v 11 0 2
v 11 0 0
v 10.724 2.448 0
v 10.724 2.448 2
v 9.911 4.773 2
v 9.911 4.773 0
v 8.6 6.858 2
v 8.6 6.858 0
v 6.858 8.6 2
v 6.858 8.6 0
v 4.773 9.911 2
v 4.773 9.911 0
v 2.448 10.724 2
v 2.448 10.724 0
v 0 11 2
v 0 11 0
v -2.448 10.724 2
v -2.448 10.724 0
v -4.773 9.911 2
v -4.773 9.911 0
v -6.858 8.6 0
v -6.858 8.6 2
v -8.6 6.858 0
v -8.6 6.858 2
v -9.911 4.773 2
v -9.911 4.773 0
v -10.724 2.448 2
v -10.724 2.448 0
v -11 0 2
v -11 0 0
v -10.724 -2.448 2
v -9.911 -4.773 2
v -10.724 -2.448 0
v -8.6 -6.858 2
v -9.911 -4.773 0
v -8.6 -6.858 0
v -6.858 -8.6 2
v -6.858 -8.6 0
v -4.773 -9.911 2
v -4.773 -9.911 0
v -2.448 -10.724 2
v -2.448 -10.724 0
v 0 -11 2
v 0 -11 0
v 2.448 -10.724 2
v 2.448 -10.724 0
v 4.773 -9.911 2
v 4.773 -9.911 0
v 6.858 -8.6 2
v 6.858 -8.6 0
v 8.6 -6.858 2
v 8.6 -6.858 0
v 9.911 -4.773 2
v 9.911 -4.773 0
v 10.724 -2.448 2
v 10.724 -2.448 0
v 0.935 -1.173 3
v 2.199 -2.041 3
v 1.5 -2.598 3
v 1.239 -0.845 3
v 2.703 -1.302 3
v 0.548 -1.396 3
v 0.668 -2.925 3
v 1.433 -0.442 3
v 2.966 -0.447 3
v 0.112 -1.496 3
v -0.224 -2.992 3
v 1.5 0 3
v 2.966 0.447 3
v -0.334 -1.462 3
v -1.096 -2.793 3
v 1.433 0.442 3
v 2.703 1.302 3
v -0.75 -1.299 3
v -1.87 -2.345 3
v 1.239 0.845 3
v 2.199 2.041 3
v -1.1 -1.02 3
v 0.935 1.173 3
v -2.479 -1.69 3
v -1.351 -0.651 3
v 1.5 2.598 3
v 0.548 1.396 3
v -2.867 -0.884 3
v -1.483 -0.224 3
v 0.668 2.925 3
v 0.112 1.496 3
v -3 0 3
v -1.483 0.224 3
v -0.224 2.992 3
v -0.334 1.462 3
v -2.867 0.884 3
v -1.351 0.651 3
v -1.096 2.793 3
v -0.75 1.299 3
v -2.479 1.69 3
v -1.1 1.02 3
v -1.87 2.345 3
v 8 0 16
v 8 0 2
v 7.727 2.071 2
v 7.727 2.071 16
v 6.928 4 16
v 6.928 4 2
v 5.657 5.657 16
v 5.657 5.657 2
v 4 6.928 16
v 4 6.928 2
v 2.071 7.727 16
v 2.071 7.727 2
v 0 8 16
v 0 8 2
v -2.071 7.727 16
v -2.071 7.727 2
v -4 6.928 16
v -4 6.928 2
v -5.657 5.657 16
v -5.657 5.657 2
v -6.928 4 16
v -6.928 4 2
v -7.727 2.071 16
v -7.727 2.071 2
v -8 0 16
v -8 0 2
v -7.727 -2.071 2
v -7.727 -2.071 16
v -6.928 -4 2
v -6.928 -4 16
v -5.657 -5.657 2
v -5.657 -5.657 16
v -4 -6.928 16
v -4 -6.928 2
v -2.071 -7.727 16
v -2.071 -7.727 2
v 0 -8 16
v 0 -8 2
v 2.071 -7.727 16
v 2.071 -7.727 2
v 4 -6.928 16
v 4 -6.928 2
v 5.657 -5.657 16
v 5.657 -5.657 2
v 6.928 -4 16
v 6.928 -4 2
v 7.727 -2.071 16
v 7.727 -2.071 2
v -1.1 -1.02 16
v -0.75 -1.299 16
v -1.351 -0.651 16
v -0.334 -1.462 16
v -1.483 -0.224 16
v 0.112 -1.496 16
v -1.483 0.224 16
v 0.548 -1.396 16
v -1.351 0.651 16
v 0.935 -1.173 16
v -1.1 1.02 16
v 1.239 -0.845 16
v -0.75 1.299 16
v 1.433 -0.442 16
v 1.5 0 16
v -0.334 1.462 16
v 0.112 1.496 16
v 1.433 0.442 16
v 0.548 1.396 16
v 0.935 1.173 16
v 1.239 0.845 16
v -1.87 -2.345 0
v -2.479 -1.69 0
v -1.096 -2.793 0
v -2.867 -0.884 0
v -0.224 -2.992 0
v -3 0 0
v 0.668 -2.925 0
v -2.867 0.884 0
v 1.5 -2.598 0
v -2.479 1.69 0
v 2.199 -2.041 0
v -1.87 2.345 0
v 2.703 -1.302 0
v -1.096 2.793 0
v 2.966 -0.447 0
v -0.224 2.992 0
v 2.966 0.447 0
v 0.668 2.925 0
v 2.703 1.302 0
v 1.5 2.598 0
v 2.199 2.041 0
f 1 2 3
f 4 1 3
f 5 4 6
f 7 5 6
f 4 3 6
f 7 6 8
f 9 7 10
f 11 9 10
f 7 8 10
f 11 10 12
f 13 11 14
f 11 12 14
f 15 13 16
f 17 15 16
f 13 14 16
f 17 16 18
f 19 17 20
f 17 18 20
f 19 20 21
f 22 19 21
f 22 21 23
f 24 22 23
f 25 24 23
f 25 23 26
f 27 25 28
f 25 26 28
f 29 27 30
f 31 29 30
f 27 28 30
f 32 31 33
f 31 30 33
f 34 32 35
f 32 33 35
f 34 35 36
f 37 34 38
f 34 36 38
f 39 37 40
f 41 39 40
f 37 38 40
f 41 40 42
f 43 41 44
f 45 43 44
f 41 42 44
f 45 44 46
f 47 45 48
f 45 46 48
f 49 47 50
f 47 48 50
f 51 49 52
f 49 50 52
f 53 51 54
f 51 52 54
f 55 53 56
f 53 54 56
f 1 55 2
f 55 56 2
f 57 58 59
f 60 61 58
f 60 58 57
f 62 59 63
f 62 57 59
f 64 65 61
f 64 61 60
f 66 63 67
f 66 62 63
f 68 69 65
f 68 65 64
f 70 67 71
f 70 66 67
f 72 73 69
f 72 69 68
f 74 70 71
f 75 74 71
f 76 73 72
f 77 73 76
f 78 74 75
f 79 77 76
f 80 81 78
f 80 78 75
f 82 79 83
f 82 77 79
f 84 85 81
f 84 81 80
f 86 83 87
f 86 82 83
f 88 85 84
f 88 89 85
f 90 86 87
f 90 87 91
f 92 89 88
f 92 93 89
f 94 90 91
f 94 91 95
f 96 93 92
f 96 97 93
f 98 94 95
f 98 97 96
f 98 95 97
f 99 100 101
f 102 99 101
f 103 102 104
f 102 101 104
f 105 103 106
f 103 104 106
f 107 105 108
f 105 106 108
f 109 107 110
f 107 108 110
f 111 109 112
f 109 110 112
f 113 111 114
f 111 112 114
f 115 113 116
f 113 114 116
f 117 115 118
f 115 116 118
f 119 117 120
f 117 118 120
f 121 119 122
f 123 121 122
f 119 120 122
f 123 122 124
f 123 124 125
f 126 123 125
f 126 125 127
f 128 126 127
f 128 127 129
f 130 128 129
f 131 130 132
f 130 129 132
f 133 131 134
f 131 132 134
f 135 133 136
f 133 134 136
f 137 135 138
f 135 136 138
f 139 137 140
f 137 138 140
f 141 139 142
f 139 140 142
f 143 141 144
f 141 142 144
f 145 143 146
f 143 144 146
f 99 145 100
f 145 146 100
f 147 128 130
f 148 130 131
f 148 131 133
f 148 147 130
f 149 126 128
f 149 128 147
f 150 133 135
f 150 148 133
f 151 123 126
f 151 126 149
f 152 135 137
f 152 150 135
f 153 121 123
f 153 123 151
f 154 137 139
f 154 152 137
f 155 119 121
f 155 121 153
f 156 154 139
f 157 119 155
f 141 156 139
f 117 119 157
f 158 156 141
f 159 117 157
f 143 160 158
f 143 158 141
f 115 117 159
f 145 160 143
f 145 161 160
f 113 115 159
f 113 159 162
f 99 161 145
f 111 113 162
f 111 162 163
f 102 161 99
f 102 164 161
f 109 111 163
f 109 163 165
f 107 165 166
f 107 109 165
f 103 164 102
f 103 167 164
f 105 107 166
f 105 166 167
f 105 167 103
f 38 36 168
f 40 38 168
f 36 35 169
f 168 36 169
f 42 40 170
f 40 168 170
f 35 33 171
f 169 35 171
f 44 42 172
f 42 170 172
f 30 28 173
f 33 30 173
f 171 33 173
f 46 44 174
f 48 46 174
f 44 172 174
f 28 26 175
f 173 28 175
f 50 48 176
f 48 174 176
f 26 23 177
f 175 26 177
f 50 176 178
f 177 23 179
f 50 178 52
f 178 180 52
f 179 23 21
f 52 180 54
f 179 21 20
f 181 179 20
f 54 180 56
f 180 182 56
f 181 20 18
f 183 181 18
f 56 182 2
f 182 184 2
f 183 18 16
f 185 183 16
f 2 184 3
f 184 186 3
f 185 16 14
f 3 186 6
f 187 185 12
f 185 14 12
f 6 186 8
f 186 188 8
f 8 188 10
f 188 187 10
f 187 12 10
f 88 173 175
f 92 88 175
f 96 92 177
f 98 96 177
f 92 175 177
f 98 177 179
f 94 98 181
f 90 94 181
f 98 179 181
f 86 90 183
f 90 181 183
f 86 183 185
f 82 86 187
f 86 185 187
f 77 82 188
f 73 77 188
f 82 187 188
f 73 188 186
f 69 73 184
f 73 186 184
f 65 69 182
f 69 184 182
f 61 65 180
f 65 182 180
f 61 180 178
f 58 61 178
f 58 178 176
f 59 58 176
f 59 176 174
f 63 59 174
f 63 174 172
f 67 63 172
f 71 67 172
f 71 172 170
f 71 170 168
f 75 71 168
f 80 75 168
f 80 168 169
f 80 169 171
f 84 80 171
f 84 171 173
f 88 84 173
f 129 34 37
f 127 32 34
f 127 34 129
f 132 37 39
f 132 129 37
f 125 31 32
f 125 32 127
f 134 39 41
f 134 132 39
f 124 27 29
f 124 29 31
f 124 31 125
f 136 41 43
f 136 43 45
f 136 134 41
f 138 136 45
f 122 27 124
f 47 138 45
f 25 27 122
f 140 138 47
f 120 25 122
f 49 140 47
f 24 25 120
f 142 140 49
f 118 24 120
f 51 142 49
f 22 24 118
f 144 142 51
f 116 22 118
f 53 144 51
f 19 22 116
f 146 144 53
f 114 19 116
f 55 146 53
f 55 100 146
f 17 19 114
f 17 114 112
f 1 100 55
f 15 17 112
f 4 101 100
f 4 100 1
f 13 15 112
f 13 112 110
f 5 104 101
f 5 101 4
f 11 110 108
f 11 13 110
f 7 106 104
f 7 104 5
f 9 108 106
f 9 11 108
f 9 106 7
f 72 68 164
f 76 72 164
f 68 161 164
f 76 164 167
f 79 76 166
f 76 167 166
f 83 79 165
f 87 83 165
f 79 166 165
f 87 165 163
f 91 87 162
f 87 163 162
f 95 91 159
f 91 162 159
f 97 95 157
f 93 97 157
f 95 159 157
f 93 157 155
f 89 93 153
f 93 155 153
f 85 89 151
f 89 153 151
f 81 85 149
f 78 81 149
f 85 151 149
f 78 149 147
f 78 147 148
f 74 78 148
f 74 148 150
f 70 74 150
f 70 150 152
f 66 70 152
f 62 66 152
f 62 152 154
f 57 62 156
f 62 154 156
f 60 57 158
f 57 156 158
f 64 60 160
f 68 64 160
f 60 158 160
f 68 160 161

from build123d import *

# Parameters (mm, degrees)
SKETCH1_R                               = 11
BOSS_EXTRUDE1_DEPTH                     = 2
SKETCH2_R                               = 8
BOSS_EXTRUDE2_DEPTH                     = 14
CBORE_FOR_M5_HEX_HEAD_BOLT1_D           = 3
CBORE_FOR_M5_HEX_HEAD_BOLT1_CBORE_D     = 6
CBORE_FOR_M5_HEX_HEAD_BOLT1_CBORE_DEPTH = 3


with BuildPart() as part:
    # Sketch1 → Boss-Extrude1 (new body)
    with BuildSketch(Plane.XY):
        Circle(SKETCH1_R)
    extrude(amount=BOSS_EXTRUDE1_DEPTH)

    # Sketch2 → Boss-Extrude2 (add)
    with BuildSketch(Plane.XY.offset(2)):
        Circle(SKETCH2_R)
    extrude(amount=BOSS_EXTRUDE2_DEPTH)

    # CBORE for M5 Hex Head Bolt1 (through all)
    with Locations(Plane(origin=(0, 0, 0), x_dir=(-1, 0, 0), z_dir=(0, 0, -1))):
        with Locations((0, 0)):
            CounterBoreHole(CBORE_FOR_M5_HEX_HEAD_BOLT1_D / 2, CBORE_FOR_M5_HEX_HEAD_BOLT1_CBORE_D / 2, CBORE_FOR_M5_HEX_HEAD_BOLT1_CBORE_DEPTH)


solid = part.part
